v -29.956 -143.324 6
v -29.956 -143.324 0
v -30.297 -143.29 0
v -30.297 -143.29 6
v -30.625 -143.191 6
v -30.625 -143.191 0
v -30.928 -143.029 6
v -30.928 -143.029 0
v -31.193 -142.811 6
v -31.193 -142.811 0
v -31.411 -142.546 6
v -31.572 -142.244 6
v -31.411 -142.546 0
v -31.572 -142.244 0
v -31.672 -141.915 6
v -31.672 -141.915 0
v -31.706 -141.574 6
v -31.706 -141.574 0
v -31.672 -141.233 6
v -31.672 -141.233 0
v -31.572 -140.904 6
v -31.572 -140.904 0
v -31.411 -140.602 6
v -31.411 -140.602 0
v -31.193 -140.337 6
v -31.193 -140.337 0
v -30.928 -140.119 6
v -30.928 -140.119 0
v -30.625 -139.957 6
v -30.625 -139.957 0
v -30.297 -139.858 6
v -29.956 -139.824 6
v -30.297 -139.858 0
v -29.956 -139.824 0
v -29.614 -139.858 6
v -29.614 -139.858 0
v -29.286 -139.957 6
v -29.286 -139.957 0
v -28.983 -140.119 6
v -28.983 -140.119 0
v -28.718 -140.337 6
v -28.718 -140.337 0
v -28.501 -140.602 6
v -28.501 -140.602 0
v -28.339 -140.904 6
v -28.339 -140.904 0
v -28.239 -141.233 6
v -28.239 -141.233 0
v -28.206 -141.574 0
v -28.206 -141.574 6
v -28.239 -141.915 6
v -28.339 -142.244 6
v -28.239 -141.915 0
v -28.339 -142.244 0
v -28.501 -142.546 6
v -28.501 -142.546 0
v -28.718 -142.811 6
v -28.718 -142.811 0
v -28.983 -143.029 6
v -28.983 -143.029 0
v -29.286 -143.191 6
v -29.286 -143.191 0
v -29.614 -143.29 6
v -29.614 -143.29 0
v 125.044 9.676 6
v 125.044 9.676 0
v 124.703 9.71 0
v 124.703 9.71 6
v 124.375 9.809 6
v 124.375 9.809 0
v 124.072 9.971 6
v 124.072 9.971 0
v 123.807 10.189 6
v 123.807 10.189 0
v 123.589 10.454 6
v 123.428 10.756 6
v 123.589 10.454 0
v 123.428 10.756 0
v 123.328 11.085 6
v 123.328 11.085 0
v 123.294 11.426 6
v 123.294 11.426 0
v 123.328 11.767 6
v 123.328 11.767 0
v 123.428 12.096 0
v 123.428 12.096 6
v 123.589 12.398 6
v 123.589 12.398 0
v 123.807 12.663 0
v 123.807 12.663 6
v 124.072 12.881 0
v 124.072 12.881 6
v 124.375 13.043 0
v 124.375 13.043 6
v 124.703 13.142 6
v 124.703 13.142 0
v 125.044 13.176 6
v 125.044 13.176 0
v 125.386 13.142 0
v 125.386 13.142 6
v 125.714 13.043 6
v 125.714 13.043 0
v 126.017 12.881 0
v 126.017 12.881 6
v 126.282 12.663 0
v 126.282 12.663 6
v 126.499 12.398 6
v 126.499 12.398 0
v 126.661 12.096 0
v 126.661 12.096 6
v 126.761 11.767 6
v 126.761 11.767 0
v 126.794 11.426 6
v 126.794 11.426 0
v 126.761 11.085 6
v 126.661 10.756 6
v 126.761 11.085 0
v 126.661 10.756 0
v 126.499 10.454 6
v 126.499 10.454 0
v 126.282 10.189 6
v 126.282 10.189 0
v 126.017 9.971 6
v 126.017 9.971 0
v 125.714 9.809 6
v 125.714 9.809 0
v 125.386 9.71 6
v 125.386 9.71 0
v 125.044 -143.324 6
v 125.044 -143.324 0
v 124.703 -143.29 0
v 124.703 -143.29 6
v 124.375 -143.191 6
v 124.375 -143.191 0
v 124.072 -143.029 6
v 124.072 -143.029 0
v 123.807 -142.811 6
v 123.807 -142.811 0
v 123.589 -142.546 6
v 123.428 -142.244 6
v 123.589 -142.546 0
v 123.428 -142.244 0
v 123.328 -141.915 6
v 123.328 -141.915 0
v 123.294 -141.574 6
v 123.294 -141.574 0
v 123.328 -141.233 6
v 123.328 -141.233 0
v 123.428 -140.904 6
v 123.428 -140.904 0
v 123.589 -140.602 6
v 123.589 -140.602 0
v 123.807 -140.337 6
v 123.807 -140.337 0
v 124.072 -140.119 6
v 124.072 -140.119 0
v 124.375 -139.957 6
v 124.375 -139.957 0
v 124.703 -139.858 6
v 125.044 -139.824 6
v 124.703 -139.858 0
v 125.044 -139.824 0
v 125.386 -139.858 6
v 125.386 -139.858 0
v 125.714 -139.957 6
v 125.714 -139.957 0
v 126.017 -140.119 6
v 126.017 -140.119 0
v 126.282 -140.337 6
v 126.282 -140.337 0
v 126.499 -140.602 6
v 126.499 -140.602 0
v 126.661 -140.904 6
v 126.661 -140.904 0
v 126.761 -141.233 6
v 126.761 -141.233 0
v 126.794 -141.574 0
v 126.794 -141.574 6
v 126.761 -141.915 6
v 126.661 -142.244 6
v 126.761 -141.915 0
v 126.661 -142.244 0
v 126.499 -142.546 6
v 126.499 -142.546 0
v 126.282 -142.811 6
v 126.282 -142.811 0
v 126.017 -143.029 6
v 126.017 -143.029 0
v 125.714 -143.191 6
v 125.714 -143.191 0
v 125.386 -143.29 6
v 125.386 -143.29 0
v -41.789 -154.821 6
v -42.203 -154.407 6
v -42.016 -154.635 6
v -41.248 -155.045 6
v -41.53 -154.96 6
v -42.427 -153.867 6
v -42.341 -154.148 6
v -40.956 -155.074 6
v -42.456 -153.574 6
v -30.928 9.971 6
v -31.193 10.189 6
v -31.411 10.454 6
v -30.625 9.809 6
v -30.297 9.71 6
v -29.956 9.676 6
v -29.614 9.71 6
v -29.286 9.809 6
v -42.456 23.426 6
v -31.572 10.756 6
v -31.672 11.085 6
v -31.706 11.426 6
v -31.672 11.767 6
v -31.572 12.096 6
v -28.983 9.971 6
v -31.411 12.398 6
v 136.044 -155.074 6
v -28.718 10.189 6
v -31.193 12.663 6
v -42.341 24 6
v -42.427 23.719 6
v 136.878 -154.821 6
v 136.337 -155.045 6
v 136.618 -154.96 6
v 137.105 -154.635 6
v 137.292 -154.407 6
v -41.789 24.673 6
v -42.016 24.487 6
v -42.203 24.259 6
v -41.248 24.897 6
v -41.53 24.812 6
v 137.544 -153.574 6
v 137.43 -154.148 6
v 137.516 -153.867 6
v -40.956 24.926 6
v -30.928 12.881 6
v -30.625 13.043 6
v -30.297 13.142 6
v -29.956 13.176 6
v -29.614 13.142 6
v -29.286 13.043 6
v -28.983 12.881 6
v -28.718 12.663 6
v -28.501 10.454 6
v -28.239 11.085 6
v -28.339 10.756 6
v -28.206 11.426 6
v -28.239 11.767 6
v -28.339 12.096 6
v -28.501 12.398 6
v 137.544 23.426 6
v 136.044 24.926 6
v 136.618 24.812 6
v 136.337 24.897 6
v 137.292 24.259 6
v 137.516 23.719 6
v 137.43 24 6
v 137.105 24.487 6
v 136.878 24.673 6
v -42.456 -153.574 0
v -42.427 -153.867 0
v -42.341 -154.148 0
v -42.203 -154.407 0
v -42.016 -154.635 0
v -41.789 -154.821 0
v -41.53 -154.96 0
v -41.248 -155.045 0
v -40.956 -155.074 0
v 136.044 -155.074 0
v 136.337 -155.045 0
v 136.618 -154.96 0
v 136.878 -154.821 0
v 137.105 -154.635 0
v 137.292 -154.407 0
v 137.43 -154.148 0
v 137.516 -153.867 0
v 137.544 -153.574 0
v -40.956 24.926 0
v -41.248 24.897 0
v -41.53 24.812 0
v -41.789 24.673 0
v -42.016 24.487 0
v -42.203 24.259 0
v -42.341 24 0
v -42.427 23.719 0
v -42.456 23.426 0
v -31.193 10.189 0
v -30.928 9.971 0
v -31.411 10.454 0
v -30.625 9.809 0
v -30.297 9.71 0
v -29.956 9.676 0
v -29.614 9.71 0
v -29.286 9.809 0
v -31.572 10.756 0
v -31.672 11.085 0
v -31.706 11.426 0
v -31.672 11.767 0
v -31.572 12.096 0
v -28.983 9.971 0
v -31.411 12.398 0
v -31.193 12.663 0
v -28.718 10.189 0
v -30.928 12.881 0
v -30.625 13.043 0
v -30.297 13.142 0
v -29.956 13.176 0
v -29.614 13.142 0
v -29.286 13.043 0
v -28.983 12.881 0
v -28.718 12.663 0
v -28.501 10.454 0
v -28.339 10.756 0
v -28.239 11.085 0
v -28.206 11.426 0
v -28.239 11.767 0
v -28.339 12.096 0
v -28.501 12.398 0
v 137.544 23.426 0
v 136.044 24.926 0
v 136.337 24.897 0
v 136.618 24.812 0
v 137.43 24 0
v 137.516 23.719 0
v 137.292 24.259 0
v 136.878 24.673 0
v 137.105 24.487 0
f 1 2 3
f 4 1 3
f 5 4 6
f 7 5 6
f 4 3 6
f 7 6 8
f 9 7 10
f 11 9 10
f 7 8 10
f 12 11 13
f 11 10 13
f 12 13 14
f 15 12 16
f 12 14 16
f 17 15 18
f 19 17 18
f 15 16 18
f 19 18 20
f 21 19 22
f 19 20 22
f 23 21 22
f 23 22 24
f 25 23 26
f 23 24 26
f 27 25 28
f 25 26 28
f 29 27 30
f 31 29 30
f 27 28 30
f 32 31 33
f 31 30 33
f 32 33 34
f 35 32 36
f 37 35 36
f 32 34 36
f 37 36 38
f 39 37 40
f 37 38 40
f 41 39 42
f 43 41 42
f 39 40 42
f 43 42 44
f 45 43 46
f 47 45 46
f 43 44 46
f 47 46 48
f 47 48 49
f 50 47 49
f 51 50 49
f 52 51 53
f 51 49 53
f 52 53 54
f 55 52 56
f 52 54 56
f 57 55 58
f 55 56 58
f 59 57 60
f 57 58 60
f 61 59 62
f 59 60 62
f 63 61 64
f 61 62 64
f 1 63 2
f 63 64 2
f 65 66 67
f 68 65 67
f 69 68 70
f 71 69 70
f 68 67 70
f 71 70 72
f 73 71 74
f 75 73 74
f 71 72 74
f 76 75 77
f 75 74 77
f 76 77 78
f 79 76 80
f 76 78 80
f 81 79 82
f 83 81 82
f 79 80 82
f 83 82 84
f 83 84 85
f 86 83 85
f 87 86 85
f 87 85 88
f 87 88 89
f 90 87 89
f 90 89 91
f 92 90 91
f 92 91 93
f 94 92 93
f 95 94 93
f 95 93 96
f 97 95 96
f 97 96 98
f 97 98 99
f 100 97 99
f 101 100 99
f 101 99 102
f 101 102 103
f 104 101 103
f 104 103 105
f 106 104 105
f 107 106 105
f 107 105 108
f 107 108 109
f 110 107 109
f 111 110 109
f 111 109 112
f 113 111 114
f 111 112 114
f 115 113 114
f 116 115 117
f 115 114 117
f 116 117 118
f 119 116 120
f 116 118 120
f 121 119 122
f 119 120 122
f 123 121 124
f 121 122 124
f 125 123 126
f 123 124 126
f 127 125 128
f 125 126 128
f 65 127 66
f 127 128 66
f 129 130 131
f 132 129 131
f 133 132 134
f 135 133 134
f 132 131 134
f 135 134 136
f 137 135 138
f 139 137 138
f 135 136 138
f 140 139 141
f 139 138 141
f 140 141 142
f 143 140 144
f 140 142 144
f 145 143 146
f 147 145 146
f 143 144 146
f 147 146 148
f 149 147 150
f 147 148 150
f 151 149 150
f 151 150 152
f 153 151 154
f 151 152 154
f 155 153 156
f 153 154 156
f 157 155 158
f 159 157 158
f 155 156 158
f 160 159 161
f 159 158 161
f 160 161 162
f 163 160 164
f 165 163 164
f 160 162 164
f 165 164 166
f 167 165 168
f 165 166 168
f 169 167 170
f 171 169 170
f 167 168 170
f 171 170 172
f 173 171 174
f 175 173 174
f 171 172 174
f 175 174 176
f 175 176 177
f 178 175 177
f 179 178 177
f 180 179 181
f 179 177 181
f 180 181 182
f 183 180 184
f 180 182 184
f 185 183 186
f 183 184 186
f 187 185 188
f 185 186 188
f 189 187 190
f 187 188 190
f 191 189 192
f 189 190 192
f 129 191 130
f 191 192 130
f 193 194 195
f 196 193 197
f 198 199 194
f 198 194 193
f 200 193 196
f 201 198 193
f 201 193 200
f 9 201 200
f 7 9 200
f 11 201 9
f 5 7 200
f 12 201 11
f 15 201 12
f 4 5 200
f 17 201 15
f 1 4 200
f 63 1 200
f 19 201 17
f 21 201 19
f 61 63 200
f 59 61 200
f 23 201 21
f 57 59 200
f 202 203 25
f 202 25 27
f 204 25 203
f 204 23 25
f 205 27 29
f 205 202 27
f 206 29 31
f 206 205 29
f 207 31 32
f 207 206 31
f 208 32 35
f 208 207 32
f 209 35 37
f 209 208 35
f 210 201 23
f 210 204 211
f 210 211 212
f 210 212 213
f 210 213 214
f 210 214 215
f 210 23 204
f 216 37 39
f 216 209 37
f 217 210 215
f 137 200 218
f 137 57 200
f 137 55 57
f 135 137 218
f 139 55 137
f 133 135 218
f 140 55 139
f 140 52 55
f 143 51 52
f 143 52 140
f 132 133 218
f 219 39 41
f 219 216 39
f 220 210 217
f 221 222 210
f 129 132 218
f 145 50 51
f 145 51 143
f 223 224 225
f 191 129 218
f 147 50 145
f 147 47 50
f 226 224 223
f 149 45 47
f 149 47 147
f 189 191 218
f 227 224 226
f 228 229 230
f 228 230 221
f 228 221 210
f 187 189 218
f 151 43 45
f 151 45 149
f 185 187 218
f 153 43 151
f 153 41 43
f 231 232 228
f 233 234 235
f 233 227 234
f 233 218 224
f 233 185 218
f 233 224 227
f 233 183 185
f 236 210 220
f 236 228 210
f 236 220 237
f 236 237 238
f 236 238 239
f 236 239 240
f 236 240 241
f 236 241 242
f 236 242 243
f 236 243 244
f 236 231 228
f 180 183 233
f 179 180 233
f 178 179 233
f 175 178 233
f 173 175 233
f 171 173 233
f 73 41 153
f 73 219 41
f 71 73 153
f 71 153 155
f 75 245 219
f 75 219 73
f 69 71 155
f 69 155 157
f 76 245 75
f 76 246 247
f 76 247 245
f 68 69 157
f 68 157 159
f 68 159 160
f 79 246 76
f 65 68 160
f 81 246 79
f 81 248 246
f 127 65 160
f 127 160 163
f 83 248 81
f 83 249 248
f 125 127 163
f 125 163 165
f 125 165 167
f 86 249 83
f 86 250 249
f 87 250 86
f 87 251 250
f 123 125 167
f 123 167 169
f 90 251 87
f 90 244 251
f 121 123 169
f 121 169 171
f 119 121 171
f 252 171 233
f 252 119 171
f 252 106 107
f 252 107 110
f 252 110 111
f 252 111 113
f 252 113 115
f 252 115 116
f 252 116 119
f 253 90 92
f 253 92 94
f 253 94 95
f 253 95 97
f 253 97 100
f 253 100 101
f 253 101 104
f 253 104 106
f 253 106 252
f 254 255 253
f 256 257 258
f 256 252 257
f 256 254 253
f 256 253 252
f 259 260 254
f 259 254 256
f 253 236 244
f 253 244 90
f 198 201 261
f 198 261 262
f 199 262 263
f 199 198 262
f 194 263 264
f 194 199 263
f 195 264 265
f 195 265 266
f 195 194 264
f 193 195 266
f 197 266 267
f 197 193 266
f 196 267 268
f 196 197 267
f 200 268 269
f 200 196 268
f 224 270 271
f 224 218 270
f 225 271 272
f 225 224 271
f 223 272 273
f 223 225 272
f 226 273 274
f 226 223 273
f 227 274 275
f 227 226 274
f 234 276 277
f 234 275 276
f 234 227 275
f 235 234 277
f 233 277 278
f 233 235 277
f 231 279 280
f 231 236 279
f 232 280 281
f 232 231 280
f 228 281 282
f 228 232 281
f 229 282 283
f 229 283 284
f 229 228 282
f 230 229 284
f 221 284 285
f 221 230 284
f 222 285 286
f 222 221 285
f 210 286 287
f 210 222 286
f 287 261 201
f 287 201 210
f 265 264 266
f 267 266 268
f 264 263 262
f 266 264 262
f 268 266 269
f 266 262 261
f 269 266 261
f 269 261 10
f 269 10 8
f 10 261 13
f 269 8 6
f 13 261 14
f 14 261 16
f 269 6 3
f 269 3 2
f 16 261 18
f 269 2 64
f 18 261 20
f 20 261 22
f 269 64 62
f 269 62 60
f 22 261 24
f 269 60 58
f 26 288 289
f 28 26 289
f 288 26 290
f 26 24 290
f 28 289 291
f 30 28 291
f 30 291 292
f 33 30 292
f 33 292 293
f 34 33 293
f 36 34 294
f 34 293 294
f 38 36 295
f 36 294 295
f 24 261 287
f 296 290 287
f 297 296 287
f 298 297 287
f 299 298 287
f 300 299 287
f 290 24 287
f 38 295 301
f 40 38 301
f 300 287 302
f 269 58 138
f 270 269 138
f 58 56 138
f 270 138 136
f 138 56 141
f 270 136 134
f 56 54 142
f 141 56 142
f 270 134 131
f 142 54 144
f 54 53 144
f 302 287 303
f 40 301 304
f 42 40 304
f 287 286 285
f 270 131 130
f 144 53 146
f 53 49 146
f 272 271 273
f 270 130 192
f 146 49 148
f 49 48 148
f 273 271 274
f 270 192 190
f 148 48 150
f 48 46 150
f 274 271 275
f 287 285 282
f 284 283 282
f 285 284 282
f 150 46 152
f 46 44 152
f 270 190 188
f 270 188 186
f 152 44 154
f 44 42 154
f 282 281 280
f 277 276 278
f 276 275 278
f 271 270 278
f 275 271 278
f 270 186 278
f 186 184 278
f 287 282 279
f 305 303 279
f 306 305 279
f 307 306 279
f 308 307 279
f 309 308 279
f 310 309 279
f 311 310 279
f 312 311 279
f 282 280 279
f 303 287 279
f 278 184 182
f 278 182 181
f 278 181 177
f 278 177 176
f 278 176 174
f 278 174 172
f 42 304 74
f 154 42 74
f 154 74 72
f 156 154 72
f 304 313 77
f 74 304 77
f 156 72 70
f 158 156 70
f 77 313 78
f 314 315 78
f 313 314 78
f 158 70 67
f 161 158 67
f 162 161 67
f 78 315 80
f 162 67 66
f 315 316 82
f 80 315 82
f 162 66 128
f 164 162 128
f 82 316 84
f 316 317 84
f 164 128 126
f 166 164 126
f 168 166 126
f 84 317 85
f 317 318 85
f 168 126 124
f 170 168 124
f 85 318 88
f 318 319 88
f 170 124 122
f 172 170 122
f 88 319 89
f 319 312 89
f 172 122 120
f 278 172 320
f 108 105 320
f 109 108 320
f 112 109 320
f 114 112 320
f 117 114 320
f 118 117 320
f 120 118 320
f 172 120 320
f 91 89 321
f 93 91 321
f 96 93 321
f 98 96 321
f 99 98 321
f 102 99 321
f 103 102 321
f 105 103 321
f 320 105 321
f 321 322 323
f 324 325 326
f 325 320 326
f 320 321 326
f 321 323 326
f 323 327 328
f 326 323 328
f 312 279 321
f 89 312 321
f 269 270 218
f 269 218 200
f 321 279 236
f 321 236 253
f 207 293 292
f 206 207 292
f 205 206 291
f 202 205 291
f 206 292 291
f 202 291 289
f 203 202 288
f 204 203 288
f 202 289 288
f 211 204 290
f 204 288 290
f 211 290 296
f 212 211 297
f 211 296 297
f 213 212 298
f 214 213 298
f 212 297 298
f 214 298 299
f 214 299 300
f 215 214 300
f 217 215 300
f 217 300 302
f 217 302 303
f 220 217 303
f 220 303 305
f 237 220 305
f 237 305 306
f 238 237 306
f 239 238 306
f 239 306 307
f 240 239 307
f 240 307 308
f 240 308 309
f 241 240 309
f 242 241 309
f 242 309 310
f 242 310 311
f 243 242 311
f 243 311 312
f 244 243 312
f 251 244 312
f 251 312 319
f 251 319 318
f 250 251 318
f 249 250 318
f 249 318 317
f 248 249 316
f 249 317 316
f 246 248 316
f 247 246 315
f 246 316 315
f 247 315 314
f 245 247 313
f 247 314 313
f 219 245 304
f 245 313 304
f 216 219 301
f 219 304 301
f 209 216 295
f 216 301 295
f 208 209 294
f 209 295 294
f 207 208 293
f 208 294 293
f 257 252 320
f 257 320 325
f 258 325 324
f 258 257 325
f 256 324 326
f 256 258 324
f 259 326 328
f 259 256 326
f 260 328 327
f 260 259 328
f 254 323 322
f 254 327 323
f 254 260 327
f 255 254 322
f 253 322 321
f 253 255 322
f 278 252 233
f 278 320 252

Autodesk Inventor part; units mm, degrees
ref_plane "YZ Plane" through (0, 0, 0) normal (1, 0, 0) x (0, 1, 0)
ref_plane "XZ Plane" through (0, 0, 0) normal (0, 1, 0) x (-1, 0, 0)
ref_plane "XY Plane" through (0, 0, 0) normal (0, 0, 1) x (1, 0, 0)
sketch "Esquisse1" plane through (0, 0, 0) normal (0, 0, 1) x (1, 0, 0)
  line L0 (-42.4556, 24.926) -> (137.5444, 24.926)
  line L1 (137.5444, 24.926) -> (137.5444, -155.074)
  line L2 (137.5444, -155.074) -> (-42.4556, -155.074)
  line L3 (-42.4556, -155.074) -> (-42.4556, 24.926)
  point P0 (0, 0)
  dimension "d0" = 180
  dimension "d1" = 180
extrude "Extrusion1" add sketch "Esquisse1" along normal blind 6
sketch "Esquisse2" plane through (0, 0, 6) normal (0, 0, 1) x (1, 0, 0)
  circle A0 centre (-29.9556, 11.426) radius 2.2339
  circle A1 centre (125.0444, 11.426) radius 4.5426
  circle A2 centre (125.0444, -141.574) radius 4.8644
  circle A3 centre (-29.9556, -141.574) radius 7.3197
  line L0 (-42.4556, 24.926) -> (-42.4556, -155.074) projected
  line L1 (-42.4556, -155.074) -> (137.5444, -155.074) projected
  line L2 (137.5444, -155.074) -> (137.5444, 24.926) projected
  line L3 (137.5444, 24.926) -> (-42.4556, 24.926) projected
  point P0 (0, 0)
  dimension "d19" = 153
  dimension "d20" = 155
  dimension "d21" = 153
  dimension "d22" = 155
  dimension "d25" = 12.5
  dimension "d26" = 12.5
  dimension "d27" = 13.5
  dimension "d28" = 13.5
hole "Perçage1" at (-29.9556, 11.426, 6) at (125.0444, 11.426, 6) at (125.0444, -141.574, 6) at (-29.9556, -141.574, 6) direction (0, 0, -1) diameter 3.5 end through all
fillet "Congé2" radius 1.5 4 edges at (-42.4556, 24.926, 3) (137.5444, 24.926, 3) (137.5444, -155.074, 3) (-42.4556, -155.074, 3)
properties part number "Etage"
